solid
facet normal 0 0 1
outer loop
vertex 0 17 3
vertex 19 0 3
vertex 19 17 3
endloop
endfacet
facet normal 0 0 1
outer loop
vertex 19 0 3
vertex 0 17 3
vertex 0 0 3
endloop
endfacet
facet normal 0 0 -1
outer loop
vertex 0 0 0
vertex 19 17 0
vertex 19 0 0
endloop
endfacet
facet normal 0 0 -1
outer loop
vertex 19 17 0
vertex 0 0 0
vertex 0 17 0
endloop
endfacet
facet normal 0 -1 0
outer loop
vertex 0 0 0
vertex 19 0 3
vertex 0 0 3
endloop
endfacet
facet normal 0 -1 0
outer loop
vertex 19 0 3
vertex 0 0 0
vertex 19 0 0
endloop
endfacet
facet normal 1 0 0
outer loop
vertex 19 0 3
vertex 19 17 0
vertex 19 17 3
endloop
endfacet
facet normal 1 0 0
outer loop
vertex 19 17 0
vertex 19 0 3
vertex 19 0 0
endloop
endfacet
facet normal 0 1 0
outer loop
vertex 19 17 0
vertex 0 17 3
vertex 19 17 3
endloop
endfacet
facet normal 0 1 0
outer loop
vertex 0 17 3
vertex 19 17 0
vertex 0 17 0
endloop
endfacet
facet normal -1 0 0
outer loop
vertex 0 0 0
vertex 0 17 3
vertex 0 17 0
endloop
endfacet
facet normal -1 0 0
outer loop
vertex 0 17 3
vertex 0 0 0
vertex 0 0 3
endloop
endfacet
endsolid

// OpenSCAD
// Generated by SolidPython 1.0.1 on 2020-07-29 00:46:56


cube(size = [19, 17, 3]);
/***********************************************
*********      SolidPython code:      **********
************************************************
 
# import packages: SolidPython
from solid import *
from solid.utils import *
from itertools import chain, combinations, permutations


class Resize:

    def __init__(self, scad_file):
        self.scad_file = scad_file
        #self.scad_file = import_scad(scad_file)
        # cone/cylinder param:
        self.r1 = 0
        self.r2 = 0
        self.h = 0
        # rectangular prism param:
        self.w = 0
        self.l = 0
        # ellipse param:
        self.r = 0

    # import OpenScad code (file name corresponds to shape)


    # classify shape + parameters
    def assign(self, param1, param2, param3):
        if self.scad_file == 'cone.scad':
            self.r1 = param1
            self.r2 = param2
            self.h = param3
        elif self.scad_file == 'cylinder.scad':
            self.r1 = param1
            self.r2 = param2
            self.h = param3
        elif self.scad_file == 'rectangularPrism.scad':
            self.h = param1
            self.l = param2
            self.w = param3
        else:
            self.r = param1
            self.h = param2

    # resize parameters
    def iterate(self):
        x = range(3, 20, 2)
        i = 1
        if self.scad_file == 'cone.scad':
            tempList = list(permutations(x, 2))
            for temp in tempList:
                param1 = temp[0]
                param2 = temp[1]
                filepath = 'produced_scad_files/' + 'cone' + str(param1) + '_' + str(param2) + '_' + '.scad'
                scad_render_to_file(cylinder(h=param1, r1=param2, r2=0), filepath)

        elif self.scad_file == 'cylinder.scad':
            tempList = list(permutations(x, 3))
            for temp in tempList:
                param1 = temp[0]
                param2 = temp[1]
                filepath = 'produced_scad_files/' + 'cylinder' + str(param1) + '_' + str(param2) + '_' + '.scad'
                scad_render_to_file(cylinder(h=param1, r1=param2, r2=param2), filepath)

        elif self.scad_file == 'rectangularPrism.scad':
            tempList = list(permutations(x, 3))
            for temp in tempList:
                param1 = temp[0]
                param2 = temp[1]
                param3 = temp[2]
                filepath = 'produced_scad_files/' + 'rectangularPrism' + str(param1) + '_' + str(param2) + '_' + str(
                    param3) + '.scad'
                scad_render_to_file(cube(size=(param1, param2, param3)), filepath)

        elif self.scad_file == 'ellipse.scad':
            tempList = list(permutations(x, 4))
            for temp in tempList:
                param1 = temp[0]
                param2 = temp[1]
                param3 = temp[2]
                param4 = temp[3]
                filepath = 'produced_scad_files/' + 'ellipse' + str(param1) + '_' + str(param2) + '_' + str(param3) + '_' + str(param4) + '.scad'
                scad_render_to_file(scale([param1, param2, param3])(sphere(r=param4)), filepath)

    def render_to_scadfile(self):
        scad_render_to_file(scad, 'example.scad') 
 
************************************************/
